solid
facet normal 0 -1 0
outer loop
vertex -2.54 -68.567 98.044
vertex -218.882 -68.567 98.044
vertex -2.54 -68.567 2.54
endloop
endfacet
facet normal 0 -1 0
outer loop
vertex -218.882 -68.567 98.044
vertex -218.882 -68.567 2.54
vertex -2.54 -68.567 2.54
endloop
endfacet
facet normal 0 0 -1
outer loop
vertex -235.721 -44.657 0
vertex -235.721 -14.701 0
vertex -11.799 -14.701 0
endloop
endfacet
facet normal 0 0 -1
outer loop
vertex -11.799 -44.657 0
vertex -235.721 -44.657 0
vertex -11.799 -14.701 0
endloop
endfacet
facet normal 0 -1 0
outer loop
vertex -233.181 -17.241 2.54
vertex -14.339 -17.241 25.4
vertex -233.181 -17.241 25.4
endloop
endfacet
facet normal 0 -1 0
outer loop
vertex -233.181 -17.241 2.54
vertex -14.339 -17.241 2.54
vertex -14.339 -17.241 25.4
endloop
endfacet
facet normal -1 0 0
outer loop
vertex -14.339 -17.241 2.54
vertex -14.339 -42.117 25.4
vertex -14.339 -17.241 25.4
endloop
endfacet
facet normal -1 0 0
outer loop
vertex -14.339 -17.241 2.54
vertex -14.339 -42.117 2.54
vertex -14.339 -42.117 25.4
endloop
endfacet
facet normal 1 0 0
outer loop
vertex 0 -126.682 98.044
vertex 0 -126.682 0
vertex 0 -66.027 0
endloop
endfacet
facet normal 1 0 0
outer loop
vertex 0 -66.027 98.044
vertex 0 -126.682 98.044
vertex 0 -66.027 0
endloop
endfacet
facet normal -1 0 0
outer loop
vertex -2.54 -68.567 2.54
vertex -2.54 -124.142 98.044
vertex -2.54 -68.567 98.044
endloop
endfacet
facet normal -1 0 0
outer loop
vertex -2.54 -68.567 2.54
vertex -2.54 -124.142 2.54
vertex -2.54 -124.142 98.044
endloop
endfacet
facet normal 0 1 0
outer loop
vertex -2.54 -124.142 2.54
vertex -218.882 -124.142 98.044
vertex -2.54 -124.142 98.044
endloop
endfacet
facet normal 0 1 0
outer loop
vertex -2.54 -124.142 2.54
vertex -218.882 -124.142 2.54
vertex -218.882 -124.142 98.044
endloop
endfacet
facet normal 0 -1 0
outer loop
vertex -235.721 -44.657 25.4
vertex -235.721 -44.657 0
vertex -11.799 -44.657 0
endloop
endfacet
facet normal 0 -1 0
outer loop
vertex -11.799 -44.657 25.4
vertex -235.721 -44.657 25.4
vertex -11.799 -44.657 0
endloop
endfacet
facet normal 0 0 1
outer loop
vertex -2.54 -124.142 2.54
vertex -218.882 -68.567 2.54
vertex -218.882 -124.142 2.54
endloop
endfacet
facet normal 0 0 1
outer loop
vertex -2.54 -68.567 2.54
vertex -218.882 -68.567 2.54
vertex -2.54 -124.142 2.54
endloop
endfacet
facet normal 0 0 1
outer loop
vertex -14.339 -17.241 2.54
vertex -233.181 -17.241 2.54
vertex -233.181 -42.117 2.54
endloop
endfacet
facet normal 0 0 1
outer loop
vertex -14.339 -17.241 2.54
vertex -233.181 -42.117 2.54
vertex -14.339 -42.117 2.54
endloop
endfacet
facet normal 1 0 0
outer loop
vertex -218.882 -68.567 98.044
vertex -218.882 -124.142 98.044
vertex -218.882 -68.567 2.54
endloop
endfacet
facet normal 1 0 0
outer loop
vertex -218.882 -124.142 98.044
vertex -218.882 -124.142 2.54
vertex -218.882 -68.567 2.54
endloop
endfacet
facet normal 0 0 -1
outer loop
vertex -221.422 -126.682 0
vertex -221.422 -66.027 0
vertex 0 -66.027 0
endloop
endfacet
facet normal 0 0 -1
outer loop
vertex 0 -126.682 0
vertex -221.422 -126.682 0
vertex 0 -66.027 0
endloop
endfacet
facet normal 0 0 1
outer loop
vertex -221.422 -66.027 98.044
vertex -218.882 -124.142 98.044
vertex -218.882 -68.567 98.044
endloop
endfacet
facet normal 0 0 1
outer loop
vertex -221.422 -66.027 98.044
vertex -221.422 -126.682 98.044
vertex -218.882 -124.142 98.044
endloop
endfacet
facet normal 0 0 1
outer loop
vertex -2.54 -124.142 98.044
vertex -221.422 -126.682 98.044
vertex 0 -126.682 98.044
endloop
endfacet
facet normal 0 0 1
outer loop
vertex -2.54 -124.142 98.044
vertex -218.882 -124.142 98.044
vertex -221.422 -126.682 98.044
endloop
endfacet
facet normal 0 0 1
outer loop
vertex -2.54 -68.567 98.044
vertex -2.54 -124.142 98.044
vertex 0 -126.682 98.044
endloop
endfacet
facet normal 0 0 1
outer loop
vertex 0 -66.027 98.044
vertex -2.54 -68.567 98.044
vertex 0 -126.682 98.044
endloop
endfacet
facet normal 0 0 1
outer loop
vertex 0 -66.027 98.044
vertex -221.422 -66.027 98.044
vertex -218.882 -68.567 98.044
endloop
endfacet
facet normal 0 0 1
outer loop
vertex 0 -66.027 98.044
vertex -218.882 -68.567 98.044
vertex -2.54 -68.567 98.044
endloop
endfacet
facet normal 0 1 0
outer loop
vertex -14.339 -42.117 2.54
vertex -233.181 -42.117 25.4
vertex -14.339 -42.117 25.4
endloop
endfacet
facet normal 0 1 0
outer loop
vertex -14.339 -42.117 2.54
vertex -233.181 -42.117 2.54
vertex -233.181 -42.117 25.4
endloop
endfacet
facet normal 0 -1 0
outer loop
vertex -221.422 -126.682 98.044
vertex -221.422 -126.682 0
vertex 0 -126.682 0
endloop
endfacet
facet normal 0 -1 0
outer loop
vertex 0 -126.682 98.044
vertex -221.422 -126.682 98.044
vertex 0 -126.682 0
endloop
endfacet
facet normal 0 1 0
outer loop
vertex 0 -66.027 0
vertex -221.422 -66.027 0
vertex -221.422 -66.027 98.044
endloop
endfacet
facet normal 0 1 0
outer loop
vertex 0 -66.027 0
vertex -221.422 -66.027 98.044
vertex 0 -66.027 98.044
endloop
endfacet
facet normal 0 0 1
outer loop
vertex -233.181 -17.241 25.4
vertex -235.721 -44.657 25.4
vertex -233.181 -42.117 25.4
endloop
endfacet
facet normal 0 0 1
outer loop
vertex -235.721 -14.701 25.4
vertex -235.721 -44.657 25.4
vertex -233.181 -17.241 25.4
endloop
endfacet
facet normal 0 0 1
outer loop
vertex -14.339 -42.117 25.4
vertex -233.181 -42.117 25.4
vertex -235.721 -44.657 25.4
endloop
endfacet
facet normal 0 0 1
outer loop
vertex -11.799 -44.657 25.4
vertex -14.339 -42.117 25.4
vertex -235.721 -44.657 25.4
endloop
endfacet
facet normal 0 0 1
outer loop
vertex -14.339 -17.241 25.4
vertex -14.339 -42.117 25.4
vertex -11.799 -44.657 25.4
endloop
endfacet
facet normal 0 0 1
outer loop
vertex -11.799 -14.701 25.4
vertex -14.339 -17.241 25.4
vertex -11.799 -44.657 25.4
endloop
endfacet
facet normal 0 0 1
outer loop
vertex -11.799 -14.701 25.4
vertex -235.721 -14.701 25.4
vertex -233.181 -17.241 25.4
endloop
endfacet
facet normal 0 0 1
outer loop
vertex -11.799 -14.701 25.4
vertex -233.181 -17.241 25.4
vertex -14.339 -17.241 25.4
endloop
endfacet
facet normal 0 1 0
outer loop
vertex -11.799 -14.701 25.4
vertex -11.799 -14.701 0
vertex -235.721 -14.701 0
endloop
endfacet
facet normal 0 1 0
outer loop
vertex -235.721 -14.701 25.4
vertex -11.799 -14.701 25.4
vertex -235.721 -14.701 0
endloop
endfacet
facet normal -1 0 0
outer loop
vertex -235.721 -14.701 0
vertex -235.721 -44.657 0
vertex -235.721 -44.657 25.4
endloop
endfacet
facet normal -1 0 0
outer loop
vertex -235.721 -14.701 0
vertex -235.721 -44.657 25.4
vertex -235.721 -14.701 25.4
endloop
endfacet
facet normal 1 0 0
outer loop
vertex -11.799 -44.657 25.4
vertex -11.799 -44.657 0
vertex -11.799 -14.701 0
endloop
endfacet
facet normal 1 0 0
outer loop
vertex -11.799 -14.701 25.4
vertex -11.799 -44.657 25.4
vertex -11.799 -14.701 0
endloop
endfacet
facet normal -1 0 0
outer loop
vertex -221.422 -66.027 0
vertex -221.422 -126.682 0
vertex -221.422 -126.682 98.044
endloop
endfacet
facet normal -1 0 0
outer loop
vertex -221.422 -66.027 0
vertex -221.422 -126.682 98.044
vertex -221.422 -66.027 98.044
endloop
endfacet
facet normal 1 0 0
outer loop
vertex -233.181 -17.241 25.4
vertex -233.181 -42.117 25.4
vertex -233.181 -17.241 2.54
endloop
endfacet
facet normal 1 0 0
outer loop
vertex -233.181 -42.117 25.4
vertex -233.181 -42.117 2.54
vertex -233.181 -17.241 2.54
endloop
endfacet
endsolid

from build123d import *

# Parameters (mm, degrees)
F0_W     = 221.422359
F0_H     = 60.654789
F1_DEPTH = 98.044
F2_T     = -2.54
F3_R     = 94.6023
F4_DEPTH = 230.632
F5_W     = 103.134141
F5_H     = 29.956847
F5_W_2   = 120.787504
F6_DEPTH = 25.4
F7_T     = -2.54


with BuildPart() as f1:
    # F0 (on Top) → F1 (new body)
    with BuildSketch(Plane.XY):
        with Locations((-110.71118, -96.354797)):
            Rectangle(F0_W, F0_H)
    extrude(amount=F1_DEPTH)

    # F2
    f2_openings = [f1.faces().sort_by_distance(p)[0] for p in [
        (-110.71118, -96.354797, 98.044),
    ]]
    offset(amount=F2_T, openings=f2_openings)

    # F3 (on Top) → F4 (cut)
    with BuildSketch(Plane.XY):
        with Locations((115.478948, 56.669008)):
            Circle(F3_R)
    extrude(amount=F4_DEPTH, mode=Mode.SUBTRACT)


with BuildPart() as f6:
    # F5 (on Top) → F6 (new body)
    with BuildSketch(Plane.XY):
        with Locations((-184.153534, -29.678948)):
            Rectangle(F5_W, F5_H)
        with Locations((-72.192712, -29.678948)):
            Rectangle(F5_W_2, F5_H)
    extrude(amount=F6_DEPTH)

    # F7
    f7_openings = [f6.faces().sort_by_distance(p)[0] for p in [
        (-123.759782, -29.678949, 25.4),
    ]]
    offset(amount=F7_T, openings=f7_openings)


solid = Compound([f1.part, f6.part])
